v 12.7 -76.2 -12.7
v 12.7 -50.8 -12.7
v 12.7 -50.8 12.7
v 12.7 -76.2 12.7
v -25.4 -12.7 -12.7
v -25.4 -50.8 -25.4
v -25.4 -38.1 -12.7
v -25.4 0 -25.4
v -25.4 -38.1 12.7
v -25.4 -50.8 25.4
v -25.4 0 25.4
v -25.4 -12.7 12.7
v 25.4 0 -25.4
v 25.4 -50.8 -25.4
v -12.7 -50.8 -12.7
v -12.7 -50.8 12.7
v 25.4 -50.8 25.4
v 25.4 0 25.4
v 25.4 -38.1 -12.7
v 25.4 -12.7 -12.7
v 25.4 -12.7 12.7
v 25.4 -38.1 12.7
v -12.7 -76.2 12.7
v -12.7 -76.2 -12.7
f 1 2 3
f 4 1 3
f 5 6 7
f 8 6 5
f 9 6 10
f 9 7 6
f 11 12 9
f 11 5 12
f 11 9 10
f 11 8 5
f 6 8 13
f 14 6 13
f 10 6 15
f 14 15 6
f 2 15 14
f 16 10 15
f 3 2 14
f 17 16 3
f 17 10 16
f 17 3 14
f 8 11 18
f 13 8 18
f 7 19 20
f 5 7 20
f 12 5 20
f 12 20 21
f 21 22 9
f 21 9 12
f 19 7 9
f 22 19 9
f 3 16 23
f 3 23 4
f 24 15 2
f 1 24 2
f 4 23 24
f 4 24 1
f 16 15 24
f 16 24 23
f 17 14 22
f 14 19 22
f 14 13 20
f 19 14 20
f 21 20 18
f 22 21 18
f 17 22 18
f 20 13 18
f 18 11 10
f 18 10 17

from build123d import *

# Parameters (mm, degrees)
F0_W     = 50.8
F0_H     = 50.8
F1_DEPTH = 50.8
F2_W     = 25.4
F2_H     = 25.4
F3_DEPTH = 25.4
F4_W     = 25.4
F4_H     = 25.4
F5_DEPTH = 50.801


with BuildPart() as f1:
    # F0 (on Front) → F1 (new body)
    with BuildSketch(Plane.XZ):
        Rectangle(F0_W, F0_H)
    extrude(amount=F1_DEPTH)

    # F2 (on face) → F3 (join)
    with BuildSketch(Plane.XZ.offset(50.8)):
        Rectangle(F2_W, F2_H)
    extrude(amount=F3_DEPTH)

    # F4 (on face) → F5 (cut, through all)
    with BuildSketch(Plane.YZ.offset(25.4)):
        with Locations((-25.4, 0)):
            Rectangle(F4_W, F4_H)
    extrude(amount=-F5_DEPTH, mode=Mode.SUBTRACT)


solid = f1.part
